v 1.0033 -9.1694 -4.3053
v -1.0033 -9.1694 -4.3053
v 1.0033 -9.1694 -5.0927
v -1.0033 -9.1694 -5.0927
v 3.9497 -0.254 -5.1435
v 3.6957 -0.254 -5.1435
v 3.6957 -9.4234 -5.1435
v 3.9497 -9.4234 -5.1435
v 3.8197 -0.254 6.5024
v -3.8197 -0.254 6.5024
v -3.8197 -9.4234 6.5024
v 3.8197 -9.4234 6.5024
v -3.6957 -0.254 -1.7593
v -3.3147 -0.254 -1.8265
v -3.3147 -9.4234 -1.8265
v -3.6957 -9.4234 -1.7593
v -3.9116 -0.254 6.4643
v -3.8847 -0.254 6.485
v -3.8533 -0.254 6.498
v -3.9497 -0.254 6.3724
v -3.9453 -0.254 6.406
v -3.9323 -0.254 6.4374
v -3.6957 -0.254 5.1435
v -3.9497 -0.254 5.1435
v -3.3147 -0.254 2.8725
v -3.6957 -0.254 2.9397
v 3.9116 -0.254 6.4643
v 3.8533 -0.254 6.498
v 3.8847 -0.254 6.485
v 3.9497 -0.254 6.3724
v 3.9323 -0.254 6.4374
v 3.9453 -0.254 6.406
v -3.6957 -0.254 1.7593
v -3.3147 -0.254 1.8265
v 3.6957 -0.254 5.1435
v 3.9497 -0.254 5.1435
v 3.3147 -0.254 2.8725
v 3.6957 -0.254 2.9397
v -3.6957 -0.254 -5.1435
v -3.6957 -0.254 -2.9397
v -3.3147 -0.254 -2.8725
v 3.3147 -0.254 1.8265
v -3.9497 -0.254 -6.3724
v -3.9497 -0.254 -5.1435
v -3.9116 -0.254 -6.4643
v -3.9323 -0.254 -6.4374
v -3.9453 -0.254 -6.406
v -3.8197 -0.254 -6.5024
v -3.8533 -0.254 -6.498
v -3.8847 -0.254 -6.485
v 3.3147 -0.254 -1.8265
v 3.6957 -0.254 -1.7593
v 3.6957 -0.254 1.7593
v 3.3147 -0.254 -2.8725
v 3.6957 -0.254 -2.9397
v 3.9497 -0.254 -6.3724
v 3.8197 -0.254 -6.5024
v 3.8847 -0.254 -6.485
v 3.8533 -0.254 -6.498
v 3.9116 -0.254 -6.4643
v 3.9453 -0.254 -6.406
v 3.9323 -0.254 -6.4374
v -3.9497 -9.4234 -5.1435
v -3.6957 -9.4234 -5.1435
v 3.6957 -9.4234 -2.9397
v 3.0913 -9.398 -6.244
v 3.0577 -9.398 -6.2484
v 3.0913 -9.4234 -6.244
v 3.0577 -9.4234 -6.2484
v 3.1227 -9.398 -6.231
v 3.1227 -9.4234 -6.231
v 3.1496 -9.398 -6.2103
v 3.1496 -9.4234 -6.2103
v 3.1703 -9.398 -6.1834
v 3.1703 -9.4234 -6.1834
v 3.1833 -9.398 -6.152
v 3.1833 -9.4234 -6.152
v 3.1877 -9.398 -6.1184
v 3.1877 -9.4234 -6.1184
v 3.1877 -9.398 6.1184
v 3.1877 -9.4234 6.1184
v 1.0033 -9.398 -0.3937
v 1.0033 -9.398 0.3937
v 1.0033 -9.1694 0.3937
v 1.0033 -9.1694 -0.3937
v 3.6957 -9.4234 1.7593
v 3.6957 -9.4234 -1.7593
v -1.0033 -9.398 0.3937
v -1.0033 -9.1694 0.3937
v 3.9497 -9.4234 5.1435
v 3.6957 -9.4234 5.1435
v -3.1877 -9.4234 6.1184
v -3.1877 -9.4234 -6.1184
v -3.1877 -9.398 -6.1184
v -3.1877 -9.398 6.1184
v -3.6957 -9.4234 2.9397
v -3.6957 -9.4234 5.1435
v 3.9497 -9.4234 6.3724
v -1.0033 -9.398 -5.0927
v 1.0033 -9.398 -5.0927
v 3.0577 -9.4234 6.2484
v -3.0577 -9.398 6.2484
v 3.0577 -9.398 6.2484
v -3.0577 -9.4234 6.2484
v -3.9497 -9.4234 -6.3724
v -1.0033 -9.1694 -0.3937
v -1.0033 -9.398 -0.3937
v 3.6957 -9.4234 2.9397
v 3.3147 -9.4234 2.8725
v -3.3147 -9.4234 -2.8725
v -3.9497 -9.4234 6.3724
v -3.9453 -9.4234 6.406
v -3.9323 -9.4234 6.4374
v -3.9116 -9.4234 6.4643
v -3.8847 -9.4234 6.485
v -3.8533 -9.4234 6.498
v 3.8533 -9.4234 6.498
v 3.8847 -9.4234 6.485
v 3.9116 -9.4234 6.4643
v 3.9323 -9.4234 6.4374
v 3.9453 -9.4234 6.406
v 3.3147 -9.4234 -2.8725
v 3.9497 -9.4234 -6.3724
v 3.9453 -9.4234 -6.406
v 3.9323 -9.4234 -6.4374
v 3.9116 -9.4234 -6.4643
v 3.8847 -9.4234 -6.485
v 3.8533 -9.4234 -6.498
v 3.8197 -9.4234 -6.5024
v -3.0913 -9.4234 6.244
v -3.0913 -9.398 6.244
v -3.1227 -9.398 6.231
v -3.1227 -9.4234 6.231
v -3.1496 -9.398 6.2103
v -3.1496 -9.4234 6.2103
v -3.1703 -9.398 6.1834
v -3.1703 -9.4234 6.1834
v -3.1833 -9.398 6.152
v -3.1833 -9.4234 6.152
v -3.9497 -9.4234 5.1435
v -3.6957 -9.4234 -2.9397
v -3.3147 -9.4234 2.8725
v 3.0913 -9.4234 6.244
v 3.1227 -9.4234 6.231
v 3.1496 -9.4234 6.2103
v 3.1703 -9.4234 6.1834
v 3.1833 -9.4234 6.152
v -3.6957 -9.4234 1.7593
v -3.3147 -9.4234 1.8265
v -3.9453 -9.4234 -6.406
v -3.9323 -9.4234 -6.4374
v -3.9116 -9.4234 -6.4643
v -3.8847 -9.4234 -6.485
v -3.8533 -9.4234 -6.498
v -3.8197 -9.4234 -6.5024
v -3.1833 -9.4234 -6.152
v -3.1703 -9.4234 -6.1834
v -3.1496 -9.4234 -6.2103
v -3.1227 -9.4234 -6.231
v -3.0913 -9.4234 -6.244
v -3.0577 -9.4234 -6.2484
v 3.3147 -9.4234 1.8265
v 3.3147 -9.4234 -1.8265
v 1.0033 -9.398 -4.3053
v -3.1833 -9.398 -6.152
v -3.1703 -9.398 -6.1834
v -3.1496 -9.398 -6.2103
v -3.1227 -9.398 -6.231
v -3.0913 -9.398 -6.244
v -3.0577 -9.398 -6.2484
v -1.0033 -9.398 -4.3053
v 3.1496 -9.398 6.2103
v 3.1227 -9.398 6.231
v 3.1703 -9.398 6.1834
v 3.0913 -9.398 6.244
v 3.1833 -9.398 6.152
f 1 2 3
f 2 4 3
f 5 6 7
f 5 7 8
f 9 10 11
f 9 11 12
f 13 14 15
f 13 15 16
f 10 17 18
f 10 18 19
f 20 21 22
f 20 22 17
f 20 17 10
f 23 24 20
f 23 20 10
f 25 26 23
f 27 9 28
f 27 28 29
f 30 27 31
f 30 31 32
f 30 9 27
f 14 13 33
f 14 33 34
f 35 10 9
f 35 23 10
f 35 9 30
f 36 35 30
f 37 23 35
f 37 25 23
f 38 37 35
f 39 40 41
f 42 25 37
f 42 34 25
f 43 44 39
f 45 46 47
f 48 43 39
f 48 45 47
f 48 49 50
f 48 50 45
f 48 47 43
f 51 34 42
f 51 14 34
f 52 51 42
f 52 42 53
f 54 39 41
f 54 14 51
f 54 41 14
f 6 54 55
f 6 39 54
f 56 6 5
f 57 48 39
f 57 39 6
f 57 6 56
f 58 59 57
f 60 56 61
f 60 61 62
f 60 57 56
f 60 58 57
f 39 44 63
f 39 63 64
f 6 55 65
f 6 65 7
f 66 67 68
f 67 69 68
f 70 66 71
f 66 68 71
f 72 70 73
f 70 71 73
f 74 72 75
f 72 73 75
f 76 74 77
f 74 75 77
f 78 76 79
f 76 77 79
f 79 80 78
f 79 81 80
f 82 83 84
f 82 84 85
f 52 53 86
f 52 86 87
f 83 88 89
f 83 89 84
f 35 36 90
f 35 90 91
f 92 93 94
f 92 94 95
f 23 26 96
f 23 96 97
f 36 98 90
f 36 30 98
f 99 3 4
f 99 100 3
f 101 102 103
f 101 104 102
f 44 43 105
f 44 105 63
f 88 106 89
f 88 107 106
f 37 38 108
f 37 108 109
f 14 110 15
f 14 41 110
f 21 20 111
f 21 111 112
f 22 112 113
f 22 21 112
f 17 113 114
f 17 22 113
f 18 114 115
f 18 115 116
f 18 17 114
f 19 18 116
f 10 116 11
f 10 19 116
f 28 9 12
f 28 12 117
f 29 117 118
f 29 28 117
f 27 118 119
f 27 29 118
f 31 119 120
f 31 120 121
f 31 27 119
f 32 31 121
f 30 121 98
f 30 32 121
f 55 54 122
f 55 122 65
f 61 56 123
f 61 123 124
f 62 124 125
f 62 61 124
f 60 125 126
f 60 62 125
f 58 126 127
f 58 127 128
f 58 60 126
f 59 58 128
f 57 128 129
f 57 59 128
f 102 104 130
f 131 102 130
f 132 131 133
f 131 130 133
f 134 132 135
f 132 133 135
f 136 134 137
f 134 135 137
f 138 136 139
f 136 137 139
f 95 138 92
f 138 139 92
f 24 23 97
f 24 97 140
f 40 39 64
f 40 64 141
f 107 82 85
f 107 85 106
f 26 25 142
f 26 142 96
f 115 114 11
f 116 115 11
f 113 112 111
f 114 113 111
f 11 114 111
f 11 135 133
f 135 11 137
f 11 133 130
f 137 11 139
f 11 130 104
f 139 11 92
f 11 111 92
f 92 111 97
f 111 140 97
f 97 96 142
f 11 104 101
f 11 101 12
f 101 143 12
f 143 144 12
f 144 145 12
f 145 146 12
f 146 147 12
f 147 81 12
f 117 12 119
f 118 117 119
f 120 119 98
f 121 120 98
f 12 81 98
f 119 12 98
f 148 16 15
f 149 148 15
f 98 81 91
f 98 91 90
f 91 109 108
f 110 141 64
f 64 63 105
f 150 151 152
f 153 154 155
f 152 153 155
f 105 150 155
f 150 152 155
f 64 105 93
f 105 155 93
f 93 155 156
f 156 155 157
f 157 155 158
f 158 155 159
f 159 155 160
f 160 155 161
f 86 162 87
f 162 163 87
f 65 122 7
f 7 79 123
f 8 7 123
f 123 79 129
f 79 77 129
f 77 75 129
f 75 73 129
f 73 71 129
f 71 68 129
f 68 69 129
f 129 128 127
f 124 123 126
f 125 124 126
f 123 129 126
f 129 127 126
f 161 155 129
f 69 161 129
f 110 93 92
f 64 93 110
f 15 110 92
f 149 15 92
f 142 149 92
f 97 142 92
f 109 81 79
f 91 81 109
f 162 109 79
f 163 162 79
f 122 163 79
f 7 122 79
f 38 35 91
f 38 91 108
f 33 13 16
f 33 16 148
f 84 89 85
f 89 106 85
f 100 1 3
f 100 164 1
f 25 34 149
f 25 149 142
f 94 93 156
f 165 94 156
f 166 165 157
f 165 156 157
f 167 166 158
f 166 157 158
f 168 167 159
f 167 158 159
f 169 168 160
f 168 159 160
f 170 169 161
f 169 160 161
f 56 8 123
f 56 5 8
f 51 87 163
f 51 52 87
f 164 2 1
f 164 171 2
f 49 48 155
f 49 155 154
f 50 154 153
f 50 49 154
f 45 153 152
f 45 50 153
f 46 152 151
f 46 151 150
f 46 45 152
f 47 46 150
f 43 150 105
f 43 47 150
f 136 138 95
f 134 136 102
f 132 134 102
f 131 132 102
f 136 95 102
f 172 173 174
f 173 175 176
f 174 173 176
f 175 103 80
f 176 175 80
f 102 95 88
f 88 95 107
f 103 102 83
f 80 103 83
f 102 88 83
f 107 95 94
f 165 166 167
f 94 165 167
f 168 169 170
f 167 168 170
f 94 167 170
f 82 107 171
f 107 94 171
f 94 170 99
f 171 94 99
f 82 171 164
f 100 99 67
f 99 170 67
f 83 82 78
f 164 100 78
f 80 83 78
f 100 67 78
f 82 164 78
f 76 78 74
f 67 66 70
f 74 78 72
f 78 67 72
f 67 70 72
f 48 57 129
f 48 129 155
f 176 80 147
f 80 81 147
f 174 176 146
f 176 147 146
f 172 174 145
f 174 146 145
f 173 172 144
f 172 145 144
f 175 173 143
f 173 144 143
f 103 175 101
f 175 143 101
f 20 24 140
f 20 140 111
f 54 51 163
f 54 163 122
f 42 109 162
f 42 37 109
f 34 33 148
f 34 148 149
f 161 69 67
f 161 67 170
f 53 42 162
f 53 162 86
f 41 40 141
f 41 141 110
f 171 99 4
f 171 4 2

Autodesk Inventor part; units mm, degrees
sketch "Sketch_2" plane through (0, -0.254, 0) normal (0, 1, 0) x (1, 0, 0)
  line L0 (-3.9497, -5.1435) -> (-3.9497, -6.3724)
  arc A0 (-3.9497, -6.3724) -> (-3.8197, -6.5024) centre (-3.8197, -6.3724) ccw
  line L1 (-3.8197, -6.5024) -> (3.8197, -6.5024)
  arc A1 (3.8197, -6.5024) -> (3.9497, -6.3724) centre (3.8197, -6.3724) ccw
  line L2 (3.9497, -6.3724) -> (3.9497, -5.1435)
  line L3 (3.9497, -5.1435) -> (3.6957, -5.1435)
  line L4 (3.6957, -5.1435) -> (3.6957, -2.9397)
  line L5 (3.6957, -2.9397) -> (3.3147, -2.8725)
  line L6 (3.3147, -2.8725) -> (3.3147, -1.8265)
  line L7 (3.3147, -1.8265) -> (3.6957, -1.7593)
  line L8 (3.6957, -1.7593) -> (3.6957, 1.7593)
  line L9 (3.6957, 1.7593) -> (3.3147, 1.8265)
  line L10 (3.3147, 1.8265) -> (3.3147, 2.8725)
  line L11 (3.3147, 2.8725) -> (3.6957, 2.9397)
  line L12 (3.6957, 2.9397) -> (3.6957, 5.1435)
  line L13 (3.6957, 5.1435) -> (3.9497, 5.1435)
  line L14 (3.9497, 5.1435) -> (3.9497, 6.3724)
  arc A2 (3.9497, 6.3724) -> (3.8197, 6.5024) centre (3.8197, 6.3724) ccw
  line L15 (3.8197, 6.5024) -> (-3.8197, 6.5024)
  arc A3 (-3.8197, 6.5024) -> (-3.9497, 6.3724) centre (-3.8197, 6.3724) ccw
  line L16 (-3.9497, 6.3724) -> (-3.9497, 5.1435)
  line L17 (-3.9497, 5.1435) -> (-3.6957, 5.1435)
  line L18 (-3.6957, 5.1435) -> (-3.6957, 2.9397)
  line L19 (-3.6957, 2.9397) -> (-3.3147, 2.8725)
  line L20 (-3.3147, 2.8725) -> (-3.3147, 1.8265)
  line L21 (-3.3147, 1.8265) -> (-3.6957, 1.7593)
  line L22 (-3.6957, 1.7593) -> (-3.6957, -1.7593)
  line L23 (-3.6957, -1.7593) -> (-3.3147, -1.8265)
  line L24 (-3.3147, -1.8265) -> (-3.3147, -2.8725)
  line L25 (-3.3147, -2.8725) -> (-3.6957, -2.9397)
  line L26 (-3.6957, -2.9397) -> (-3.6957, -5.1435)
  line L27 (-3.6957, -5.1435) -> (-3.9497, -5.1435)
extrude "Extrusion1" add sketch "Sketch_2" against normal blind 9.1694
sketch "Sketch_1" plane through (0, -9.4234, 0) normal (0, 1, 0) x (1, 0, 0)
  line L0 (-3.1877, 6.1184) -> (-3.1877, -6.1184)
  arc A0 (-3.1877, -6.1184) -> (-3.0577, -6.2484) centre (-3.0577, -6.1184) ccw
  line L1 (-3.0577, -6.2484) -> (3.0577, -6.2484)
  arc A1 (3.0577, -6.2484) -> (3.1877, -6.1184) centre (3.0577, -6.1184) ccw
  line L2 (3.1877, -6.1184) -> (3.1877, 6.1184)
  arc A2 (3.1877, 6.1184) -> (3.0577, 6.2484) centre (3.0577, 6.1184) ccw
  line L3 (3.0577, 6.2484) -> (-3.0577, 6.2484)
  arc A3 (-3.0577, 6.2484) -> (-3.1877, 6.1184) centre (-3.0577, 6.1184) ccw
extrude "Extrusion2" cut sketch "Sketch_1" along normal blind 0.0254
sketch "Sketch_7" plane through (0, -9.4234, 0) normal (0, 1, 0) x (1, 0, 0)
  line L0 (-1.0033, 5.0927) -> (-1.0033, 4.3053)
  line L1 (-1.0033, 4.3053) -> (1.0033, 4.3053)
  line L2 (1.0033, 4.3053) -> (1.0033, 5.0927)
  line L3 (1.0033, 5.0927) -> (-1.0033, 5.0927)
extrude "Extrusion3" cut sketch "Sketch_7" along normal blind 0.254
pattern_linear "Rectangular Pattern1" count 2 spacing 4.699 along (0, 0, 1) of "Extrusion3"
ref_plane "rot_XY" through (0, 6.6675, 0) normal (1, 0, 0) x (0, 0, -1)
ref_plane "rot_YZ" through (0, 6.6675, 0) normal (0, 0, -1) x (0, 1, 0)
ref_plane "rot_ZX" through (0, 6.6675, 0) normal (0, 1, 0) x (1, 0, 0)
ref_plane "to_cover_XY" through (0, -0.254, 0) normal (0, 1, 0) x (1, 0, 0)
ref_plane "to_cover_YZ" through (0, -0.254, 0) normal (1, 0, 0) x (0, 0, -1)
ref_plane "to_cover_ZX" through (0, -0.254, 0) normal (0, 0, -1) x (0, 1, 0)
ref_plane "to_terminals_XY" through (0, -9.4234, 0) normal (0, 1, 0) x (1, 0, 0)
ref_plane "to_terminals_YZ" through (0, -9.4234, 0) normal (1, 0, 0) x (0, 0, -1)
ref_plane "to_terminals_ZX" through (0, -9.4234, 0) normal (0, 0, -1) x (0, 1, 0)
properties part number "M20111SS1W01-switch"
